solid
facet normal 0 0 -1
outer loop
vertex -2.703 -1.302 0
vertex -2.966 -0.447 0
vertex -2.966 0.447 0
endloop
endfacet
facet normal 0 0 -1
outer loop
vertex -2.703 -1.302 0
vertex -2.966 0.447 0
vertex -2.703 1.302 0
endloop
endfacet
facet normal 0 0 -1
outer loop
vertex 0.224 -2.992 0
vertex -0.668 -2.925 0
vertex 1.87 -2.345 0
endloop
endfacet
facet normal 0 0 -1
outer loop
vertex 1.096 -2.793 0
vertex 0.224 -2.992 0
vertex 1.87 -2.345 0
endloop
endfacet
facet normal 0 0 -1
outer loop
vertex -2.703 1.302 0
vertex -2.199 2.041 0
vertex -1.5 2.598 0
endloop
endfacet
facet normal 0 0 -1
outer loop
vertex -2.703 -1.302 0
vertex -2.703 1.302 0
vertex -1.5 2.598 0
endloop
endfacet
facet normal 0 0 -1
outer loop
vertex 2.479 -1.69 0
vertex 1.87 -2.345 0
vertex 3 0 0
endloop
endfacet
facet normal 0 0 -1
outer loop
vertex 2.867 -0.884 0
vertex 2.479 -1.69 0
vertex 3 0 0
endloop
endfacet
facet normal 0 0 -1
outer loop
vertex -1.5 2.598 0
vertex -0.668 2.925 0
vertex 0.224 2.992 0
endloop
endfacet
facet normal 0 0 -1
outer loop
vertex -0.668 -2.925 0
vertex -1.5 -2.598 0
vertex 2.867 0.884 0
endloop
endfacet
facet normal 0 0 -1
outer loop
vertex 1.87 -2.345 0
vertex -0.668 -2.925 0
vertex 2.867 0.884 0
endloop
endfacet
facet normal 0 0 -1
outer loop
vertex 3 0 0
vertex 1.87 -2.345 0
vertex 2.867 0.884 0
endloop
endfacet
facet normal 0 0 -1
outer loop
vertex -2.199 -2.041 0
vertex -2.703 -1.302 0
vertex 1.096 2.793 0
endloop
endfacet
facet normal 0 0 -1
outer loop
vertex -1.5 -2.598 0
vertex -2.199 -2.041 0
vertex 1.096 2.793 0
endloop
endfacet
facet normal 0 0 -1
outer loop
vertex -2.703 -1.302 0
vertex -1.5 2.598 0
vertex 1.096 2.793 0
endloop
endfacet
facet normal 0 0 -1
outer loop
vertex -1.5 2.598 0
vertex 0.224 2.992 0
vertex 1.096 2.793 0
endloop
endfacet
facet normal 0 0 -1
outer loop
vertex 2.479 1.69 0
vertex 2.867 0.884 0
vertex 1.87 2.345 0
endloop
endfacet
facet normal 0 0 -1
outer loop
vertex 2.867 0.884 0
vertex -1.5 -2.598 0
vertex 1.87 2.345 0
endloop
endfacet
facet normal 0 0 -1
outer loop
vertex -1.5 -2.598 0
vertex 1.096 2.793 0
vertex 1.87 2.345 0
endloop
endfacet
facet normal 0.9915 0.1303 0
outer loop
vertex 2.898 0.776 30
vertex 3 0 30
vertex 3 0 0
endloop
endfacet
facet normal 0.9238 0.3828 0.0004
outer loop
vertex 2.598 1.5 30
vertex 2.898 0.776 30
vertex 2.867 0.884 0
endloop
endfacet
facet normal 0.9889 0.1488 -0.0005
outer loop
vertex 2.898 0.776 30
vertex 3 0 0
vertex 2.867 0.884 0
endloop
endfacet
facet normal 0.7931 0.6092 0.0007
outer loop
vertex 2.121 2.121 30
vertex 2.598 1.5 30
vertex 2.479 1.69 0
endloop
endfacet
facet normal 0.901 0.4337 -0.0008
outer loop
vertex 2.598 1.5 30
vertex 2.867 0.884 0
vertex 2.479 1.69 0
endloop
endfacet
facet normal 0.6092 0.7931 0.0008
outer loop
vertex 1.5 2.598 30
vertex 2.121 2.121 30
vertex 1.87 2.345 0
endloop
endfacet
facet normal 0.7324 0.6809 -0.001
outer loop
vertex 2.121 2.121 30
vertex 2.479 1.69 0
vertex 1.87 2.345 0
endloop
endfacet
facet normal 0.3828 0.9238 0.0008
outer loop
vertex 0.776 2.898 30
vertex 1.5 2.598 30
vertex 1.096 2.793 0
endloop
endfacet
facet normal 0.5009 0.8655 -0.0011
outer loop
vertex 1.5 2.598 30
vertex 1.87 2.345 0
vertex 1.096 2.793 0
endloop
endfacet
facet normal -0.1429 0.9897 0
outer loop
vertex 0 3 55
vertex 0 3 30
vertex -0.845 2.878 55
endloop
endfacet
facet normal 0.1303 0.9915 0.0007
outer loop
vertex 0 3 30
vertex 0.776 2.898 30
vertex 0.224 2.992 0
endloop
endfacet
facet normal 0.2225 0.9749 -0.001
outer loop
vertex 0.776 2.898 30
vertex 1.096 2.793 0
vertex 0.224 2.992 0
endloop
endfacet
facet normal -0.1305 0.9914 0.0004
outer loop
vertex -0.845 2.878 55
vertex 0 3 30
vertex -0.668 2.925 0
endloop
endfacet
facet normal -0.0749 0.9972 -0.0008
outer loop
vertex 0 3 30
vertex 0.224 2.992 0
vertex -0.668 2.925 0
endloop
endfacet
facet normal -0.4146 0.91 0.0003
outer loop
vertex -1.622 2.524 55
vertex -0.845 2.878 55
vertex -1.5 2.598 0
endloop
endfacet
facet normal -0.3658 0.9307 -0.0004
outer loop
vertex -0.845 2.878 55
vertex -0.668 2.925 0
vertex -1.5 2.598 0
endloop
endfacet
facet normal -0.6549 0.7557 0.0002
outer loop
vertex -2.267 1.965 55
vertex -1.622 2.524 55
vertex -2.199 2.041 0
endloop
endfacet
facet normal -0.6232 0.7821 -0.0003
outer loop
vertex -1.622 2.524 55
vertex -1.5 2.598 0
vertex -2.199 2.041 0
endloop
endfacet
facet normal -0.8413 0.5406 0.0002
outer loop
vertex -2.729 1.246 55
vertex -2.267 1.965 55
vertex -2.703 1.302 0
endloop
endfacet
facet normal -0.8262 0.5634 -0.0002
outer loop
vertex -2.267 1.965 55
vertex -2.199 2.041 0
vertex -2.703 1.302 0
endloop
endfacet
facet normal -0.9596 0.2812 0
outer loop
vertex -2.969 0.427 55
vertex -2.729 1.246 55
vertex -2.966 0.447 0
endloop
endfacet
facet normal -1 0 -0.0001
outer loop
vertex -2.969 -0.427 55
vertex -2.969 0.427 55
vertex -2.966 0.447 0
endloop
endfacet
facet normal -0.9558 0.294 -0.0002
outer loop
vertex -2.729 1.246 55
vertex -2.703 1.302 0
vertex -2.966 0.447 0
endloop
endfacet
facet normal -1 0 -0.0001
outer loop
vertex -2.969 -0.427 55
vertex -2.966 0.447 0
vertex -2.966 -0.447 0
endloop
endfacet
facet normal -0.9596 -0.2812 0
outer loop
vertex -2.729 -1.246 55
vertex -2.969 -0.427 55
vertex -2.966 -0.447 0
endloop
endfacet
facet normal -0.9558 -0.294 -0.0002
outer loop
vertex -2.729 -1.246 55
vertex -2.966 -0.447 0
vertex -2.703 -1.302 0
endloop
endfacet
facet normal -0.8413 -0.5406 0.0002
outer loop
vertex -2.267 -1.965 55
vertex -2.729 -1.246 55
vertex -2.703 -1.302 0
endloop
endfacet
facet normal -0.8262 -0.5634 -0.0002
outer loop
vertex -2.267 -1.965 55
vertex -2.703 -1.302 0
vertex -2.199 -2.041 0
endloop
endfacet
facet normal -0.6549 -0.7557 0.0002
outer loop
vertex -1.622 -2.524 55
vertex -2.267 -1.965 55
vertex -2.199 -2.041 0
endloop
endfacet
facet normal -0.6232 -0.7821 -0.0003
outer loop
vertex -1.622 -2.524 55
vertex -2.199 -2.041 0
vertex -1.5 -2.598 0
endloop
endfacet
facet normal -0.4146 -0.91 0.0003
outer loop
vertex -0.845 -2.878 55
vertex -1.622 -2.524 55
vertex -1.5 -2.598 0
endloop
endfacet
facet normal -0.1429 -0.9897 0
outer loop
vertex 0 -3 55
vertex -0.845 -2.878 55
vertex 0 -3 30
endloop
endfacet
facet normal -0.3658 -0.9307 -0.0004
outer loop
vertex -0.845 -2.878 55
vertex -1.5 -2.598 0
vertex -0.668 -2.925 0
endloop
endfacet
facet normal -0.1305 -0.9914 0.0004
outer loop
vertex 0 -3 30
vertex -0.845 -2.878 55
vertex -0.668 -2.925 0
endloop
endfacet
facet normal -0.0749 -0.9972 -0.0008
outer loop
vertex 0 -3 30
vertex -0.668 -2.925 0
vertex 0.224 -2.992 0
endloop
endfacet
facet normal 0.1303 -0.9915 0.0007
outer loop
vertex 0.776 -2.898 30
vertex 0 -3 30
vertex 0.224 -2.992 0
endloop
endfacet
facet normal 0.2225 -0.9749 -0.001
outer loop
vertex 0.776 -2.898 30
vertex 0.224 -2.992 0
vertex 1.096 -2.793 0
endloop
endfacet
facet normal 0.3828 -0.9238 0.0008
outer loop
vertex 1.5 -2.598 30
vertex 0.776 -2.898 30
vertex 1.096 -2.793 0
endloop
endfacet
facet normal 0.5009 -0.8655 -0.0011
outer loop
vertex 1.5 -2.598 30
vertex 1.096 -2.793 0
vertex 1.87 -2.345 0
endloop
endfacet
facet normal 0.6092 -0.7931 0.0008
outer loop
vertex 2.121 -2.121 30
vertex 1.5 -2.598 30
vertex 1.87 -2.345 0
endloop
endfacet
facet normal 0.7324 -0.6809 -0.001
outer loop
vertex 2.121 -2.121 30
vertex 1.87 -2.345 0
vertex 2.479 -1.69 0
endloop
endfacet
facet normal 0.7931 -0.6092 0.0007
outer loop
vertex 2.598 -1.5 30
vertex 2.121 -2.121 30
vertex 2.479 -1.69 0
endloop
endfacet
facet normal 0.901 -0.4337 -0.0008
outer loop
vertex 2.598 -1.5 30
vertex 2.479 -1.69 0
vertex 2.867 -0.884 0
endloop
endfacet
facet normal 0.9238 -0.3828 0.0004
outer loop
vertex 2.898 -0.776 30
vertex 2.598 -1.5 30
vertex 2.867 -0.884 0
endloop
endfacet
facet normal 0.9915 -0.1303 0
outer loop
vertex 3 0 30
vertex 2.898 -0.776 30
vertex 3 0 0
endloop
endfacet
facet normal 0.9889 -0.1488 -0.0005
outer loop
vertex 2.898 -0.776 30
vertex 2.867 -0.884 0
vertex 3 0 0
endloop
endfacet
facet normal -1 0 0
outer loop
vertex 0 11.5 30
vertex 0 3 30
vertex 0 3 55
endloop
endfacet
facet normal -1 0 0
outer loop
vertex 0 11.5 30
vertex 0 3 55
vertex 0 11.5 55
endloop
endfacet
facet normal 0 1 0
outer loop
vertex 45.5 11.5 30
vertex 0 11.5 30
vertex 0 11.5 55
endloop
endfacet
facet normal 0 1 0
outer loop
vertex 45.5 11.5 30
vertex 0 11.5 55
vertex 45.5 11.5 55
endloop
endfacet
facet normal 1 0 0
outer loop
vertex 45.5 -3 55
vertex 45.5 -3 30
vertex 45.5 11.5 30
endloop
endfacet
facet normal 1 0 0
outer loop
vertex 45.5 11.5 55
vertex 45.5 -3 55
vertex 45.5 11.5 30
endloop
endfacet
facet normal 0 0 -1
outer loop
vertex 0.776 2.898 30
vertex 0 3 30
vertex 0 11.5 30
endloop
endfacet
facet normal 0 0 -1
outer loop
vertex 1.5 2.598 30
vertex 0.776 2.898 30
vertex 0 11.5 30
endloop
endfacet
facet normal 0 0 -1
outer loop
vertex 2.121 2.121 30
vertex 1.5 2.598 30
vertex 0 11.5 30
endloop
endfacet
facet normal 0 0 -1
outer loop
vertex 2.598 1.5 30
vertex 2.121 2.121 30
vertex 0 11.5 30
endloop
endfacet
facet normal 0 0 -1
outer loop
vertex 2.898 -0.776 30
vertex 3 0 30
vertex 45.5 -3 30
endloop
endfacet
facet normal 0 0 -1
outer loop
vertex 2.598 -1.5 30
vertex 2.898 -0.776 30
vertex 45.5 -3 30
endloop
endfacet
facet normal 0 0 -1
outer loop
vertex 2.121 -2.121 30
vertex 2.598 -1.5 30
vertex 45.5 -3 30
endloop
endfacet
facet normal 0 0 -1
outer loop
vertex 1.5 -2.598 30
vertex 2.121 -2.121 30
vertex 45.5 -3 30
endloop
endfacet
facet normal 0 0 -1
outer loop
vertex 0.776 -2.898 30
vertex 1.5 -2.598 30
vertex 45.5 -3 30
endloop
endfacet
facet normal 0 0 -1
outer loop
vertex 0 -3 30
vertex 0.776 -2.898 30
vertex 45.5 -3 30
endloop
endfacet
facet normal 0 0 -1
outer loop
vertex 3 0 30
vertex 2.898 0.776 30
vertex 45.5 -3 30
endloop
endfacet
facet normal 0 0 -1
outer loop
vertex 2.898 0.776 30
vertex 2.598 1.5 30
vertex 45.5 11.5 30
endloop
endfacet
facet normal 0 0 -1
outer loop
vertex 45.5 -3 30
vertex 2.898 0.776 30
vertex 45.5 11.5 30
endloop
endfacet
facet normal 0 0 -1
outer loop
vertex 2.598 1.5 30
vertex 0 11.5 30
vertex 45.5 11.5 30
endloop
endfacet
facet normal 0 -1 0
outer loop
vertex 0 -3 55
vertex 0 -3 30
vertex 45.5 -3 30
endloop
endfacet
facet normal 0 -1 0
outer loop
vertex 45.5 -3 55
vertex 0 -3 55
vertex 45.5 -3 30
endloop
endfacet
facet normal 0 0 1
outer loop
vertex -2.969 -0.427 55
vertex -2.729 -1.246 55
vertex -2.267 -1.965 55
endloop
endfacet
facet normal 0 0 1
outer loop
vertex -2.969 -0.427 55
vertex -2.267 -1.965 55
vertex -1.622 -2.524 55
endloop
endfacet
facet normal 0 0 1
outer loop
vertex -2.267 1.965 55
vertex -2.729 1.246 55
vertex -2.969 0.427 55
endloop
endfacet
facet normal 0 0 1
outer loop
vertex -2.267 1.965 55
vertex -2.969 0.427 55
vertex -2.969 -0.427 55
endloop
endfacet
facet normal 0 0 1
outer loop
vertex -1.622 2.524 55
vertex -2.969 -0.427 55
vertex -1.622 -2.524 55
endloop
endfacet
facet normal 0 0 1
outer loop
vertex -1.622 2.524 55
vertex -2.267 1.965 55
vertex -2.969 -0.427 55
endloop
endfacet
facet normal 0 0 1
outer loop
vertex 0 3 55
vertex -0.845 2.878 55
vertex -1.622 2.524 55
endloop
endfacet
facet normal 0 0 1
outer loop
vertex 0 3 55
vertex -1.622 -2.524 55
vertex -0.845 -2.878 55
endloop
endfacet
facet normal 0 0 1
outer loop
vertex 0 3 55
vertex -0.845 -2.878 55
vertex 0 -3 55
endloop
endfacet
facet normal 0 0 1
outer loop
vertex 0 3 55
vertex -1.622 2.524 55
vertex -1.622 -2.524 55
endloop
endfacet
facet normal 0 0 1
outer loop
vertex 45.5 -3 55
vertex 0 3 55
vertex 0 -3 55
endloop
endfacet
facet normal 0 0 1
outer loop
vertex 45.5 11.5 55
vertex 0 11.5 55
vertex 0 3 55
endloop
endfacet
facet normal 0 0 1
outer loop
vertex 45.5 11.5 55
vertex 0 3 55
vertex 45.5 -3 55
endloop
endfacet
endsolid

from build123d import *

# Parameters (mm, degrees)
CYLINDER_R     = 3
CYLINDER_DEPTH = 55
BOX_W          = 45.5
BOX_H          = 14.5
BOX_DEPTH      = 25


with BuildPart() as cylinder:
    # Cylinder → Cylinder (new body)
    with BuildSketch(Plane.XY):
        Circle(CYLINDER_R)
    extrude(amount=CYLINDER_DEPTH)


with BuildPart() as fusion:
    # Box → Box (new body)
    with BuildSketch(Plane(origin=(0, -3, 30), x_dir=(1, 0, 0), z_dir=(0, 0, 1))):
        with Locations((22.75, 7.25)):
            Rectangle(BOX_W, BOX_H)
    extrude(amount=BOX_DEPTH)

    # Fusion: union Cylinder
    add(cylinder.part)


solid = fusion.part
